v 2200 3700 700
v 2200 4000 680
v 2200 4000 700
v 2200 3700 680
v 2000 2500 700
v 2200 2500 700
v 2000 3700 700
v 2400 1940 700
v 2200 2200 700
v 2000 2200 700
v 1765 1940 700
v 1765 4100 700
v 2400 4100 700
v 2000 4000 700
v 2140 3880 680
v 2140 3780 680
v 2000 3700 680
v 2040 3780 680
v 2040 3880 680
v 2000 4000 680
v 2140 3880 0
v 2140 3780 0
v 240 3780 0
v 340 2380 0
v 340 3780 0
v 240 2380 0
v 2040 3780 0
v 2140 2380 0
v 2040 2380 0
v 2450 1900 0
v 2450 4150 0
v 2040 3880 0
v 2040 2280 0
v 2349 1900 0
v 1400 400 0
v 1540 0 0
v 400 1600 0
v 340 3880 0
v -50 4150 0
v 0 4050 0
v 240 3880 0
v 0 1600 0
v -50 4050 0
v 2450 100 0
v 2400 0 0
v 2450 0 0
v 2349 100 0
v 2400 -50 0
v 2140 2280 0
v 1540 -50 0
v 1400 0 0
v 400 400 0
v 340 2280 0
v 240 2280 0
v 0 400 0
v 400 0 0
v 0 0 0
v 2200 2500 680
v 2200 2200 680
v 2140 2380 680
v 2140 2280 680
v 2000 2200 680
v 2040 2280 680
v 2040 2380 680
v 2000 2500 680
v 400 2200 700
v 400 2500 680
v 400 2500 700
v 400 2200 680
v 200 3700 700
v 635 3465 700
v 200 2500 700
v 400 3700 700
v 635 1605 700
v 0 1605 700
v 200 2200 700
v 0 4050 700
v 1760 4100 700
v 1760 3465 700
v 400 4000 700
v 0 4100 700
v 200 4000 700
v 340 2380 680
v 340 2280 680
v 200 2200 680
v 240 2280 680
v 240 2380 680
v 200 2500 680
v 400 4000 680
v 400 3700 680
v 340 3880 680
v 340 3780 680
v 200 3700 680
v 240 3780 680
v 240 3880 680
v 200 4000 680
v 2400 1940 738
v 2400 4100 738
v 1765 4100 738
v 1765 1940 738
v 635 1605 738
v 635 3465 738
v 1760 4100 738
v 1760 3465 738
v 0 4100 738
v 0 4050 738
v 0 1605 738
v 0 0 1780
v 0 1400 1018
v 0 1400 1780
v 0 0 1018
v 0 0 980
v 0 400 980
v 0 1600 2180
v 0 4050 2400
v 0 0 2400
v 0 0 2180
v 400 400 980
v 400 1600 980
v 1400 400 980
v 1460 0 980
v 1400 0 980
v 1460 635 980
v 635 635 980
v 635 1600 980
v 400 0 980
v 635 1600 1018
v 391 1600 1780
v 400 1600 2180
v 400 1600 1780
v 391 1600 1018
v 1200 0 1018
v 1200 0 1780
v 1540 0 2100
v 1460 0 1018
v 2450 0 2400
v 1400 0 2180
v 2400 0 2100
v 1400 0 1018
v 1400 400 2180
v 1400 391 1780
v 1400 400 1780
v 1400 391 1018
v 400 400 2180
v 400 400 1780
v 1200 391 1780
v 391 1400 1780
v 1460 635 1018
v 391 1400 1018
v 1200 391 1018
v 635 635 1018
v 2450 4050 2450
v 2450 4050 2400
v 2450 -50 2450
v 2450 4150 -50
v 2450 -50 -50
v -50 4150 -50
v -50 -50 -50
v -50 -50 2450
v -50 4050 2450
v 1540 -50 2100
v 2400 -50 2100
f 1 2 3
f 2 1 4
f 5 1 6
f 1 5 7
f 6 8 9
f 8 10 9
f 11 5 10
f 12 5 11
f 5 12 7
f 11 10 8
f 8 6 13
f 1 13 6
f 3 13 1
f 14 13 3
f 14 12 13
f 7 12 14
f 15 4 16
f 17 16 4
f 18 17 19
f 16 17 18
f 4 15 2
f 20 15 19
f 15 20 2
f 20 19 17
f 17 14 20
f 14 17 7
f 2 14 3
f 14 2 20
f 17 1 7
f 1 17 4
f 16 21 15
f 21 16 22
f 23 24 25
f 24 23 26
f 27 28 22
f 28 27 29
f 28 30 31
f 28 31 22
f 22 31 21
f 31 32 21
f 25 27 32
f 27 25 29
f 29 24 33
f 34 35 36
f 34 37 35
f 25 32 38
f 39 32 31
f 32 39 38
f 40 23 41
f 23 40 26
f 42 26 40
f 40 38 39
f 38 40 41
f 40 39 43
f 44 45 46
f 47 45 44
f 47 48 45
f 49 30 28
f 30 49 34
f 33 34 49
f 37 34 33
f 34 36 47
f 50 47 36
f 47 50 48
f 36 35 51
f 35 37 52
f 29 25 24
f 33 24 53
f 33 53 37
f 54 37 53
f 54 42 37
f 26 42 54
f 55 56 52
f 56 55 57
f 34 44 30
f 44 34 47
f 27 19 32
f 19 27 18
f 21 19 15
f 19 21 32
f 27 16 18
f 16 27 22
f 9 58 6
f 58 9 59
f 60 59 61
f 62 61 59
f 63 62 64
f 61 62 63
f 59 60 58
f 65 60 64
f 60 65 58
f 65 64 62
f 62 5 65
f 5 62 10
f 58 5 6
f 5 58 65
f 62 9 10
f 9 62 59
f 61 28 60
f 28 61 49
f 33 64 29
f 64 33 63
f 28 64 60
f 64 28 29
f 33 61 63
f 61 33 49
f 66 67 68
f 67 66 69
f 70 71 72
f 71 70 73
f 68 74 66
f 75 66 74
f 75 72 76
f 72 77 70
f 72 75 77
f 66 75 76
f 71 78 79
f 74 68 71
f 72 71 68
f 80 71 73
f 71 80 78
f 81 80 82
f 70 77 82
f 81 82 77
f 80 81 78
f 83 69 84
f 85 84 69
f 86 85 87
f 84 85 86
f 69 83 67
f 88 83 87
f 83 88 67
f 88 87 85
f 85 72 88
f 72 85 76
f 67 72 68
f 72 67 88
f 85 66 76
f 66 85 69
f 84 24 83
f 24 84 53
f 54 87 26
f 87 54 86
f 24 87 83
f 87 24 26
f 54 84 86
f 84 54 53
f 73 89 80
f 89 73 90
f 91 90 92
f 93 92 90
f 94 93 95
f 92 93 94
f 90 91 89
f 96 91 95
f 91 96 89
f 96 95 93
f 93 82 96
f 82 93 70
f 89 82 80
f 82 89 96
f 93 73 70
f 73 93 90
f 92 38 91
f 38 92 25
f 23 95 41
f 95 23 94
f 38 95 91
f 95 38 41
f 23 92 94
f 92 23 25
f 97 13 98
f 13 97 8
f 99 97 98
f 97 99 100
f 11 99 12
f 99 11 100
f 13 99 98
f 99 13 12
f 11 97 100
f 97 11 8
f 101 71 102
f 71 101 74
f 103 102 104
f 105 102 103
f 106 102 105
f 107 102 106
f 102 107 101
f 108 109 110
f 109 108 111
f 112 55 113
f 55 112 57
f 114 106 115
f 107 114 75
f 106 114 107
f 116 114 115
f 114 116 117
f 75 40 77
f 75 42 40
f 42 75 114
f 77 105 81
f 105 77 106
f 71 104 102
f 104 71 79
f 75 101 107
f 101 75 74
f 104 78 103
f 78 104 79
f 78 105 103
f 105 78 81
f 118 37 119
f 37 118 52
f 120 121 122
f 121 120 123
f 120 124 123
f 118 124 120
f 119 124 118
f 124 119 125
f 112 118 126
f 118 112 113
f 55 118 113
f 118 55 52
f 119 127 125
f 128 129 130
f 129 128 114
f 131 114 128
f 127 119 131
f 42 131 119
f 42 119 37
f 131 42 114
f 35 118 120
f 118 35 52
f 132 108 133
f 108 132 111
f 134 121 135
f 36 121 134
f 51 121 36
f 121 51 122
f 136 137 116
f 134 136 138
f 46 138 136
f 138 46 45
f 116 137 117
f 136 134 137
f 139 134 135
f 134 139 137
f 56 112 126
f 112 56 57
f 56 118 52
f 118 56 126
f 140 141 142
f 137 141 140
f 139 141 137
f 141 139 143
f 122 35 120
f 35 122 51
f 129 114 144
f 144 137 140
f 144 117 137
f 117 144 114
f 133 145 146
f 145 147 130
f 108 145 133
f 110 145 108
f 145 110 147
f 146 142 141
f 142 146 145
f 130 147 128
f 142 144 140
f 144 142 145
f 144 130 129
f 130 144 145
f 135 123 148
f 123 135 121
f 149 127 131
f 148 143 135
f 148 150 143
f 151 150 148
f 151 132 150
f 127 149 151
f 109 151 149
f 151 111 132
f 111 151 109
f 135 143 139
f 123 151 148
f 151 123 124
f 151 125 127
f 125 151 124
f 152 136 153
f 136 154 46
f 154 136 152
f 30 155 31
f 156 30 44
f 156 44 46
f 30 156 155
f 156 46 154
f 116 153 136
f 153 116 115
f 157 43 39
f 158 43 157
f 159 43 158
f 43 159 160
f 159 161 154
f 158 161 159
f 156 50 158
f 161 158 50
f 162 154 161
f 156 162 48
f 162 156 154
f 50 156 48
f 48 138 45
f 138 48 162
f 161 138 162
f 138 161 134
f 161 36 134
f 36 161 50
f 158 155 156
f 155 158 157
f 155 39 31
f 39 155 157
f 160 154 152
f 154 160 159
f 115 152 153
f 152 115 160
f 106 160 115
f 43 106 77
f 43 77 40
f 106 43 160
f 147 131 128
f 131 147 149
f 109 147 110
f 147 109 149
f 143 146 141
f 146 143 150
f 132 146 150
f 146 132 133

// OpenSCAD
wbH 				= 980;
cbH 				= 600;
tcbH 			= 400;
topCabH			= 1780;
roomWidth		= 2400;
roomLength		= 4100;
roomHeight		= 2400;
wbLength 		= 1860;
wbWidth 			= 635;
wbHeight 		= 38;
cabinet60x60x40	= [400,600,880];
cabinet40x60x40	= [400,400,880];
cabinet60x40x40	= [600,400,400];
cabinet40x40x40	= [400,400,400];
cabinet20x39x60	= [391,200,800];

// Side 1560 wide + door = 2100 - door
module room() {
	translate([-50, -50, 2400]) color("LightGrey",0.2) cube([2500, 4100, 50], center = false);
	translate([-50, -50, 0]) color("LightYellow",0.2) cube([50, 4100, 2400], center = false);

	difference() {
		translate([-50, -50, 0]) color("LightYellow",0.2) cube([2500, 50, 2400], center = false);
		translate([2400 - 860 , -60, 0]) {
			color("LightGrey",0.5) cube([860, 110, 2100], center = false);			
		}
	}

	difference() {
		translate([-50, -50, -50]) {
			color("LightGrey",0.5) cube([roomWidth + 100, roomLength + 100, 50], center = false);
		}
		
		translate([2349, 100, 0]) {
			color("LightGrey",0.5) cube([110, 1800, 2100], center = false);			
		}
	}
}

module desk() {
	// Computer
	translate([roomWidth - wbWidth, roomLength-wbLength, 700]) {
		color("BurlyWood", 1.0) cube([wbWidth, wbLength, wbHeight]);
	}

	// Printer
	translate([roomWidth - wbWidth, roomLength-wbLength-300, 700]) {
		color("BurlyWood", 1.0) cube([wbWidth, 300, wbHeight]);
	}

	// Electronics
	translate([0, roomLength-wbLength - wbWidth, 700]) {
		color("BurlyWood", 1.0) cube([wbWidth, wbLength, wbHeight]);
	}

	// Divider
	translate([0, roomLength - wbWidth, 700]) {
		color("BurlyWood", 1.0) cube([wbLength - 100, wbWidth, wbHeight]);
	}

	translate([2000, 3700,0]) legs();
	translate([2000, 2200,0]) legs();
	translate([200, 2200,0]) legs();
	translate([200, 3700,0]) legs();
}

module workbench() {
	translate([0, 0, wbH]) {
		color("BurlyWood", 1.0) cube([wbLength - 400, wbWidth, wbHeight]);
	}

	translate([0, wbWidth, wbH]) {
		color("BurlyWood", 1.0) cube([wbWidth, wbLength - 895, wbHeight]);
	}
}

module base_cabinets() {	
	
	translate([0, 400, 100]) {
		color("white", 1.0) cube(cabinet60x60x40);
	}

	translate([0, 1000, 100]) {
		color("white", 1.0) cube(cabinet60x60x40);
	}

	translate([1000, 0, 100]) {
		rotate([0, 0, 90]) color("white", 1.0) cube(cabinet60x60x40);
	}

	translate([1400, 0, 100]) {
		rotate([0, 0, 90]) color("white", 1.0) cube(cabinet40x60x40);
	}
	
	// Sockel
	translate([0, 400, 0]) {
		color("lightgrey", 1.0) cube([400, 1200, 100]);
	}

	// Sockel
	translate([400, 400, 0]) {
		rotate([0, 0, 270]) color("lightgrey", 1.0) cube([400, 1000, 100]);
	}
}

module top_cabinets() {
	translate([0, 0, topCabH]) color("white", 0.5) cube(400, 400, 400);
	
	translate([400, 0, topCabH]) {
		color("white", 1.0) cube(cabinet60x40x40);
	}

	translate([1000, 0, topCabH]) {
		color("white", 1.0) cube(cabinet40x40x40);
	}

	translate([400, 400, topCabH]) {
		rotate([0, 0, 90]) {
			color("white", 1.0) cube(cabinet60x40x40);
		}
	}
	
	translate([400, 1000, topCabH]) {
		rotate([0, 0, 90]) {
			color("white", 1.0) cube(cabinet60x40x40);
		}
	}	
}

module legs() {
	translate([0,0,680]) {
		cube([200,300,20]);
	}

	translate([40,80,0]) {
		cube([100,100,680]);
	}
}

translate([0, 1400, wbH]) color("white", 1.0) cube(cabinet20x39x60);
translate([1200, 391, wbH]) color("white", 1.0) rotate([0, 0, 270]) cube(cabinet20x39x60);
desk();
base_cabinets();
top_cabinets();
workbench();
room();
